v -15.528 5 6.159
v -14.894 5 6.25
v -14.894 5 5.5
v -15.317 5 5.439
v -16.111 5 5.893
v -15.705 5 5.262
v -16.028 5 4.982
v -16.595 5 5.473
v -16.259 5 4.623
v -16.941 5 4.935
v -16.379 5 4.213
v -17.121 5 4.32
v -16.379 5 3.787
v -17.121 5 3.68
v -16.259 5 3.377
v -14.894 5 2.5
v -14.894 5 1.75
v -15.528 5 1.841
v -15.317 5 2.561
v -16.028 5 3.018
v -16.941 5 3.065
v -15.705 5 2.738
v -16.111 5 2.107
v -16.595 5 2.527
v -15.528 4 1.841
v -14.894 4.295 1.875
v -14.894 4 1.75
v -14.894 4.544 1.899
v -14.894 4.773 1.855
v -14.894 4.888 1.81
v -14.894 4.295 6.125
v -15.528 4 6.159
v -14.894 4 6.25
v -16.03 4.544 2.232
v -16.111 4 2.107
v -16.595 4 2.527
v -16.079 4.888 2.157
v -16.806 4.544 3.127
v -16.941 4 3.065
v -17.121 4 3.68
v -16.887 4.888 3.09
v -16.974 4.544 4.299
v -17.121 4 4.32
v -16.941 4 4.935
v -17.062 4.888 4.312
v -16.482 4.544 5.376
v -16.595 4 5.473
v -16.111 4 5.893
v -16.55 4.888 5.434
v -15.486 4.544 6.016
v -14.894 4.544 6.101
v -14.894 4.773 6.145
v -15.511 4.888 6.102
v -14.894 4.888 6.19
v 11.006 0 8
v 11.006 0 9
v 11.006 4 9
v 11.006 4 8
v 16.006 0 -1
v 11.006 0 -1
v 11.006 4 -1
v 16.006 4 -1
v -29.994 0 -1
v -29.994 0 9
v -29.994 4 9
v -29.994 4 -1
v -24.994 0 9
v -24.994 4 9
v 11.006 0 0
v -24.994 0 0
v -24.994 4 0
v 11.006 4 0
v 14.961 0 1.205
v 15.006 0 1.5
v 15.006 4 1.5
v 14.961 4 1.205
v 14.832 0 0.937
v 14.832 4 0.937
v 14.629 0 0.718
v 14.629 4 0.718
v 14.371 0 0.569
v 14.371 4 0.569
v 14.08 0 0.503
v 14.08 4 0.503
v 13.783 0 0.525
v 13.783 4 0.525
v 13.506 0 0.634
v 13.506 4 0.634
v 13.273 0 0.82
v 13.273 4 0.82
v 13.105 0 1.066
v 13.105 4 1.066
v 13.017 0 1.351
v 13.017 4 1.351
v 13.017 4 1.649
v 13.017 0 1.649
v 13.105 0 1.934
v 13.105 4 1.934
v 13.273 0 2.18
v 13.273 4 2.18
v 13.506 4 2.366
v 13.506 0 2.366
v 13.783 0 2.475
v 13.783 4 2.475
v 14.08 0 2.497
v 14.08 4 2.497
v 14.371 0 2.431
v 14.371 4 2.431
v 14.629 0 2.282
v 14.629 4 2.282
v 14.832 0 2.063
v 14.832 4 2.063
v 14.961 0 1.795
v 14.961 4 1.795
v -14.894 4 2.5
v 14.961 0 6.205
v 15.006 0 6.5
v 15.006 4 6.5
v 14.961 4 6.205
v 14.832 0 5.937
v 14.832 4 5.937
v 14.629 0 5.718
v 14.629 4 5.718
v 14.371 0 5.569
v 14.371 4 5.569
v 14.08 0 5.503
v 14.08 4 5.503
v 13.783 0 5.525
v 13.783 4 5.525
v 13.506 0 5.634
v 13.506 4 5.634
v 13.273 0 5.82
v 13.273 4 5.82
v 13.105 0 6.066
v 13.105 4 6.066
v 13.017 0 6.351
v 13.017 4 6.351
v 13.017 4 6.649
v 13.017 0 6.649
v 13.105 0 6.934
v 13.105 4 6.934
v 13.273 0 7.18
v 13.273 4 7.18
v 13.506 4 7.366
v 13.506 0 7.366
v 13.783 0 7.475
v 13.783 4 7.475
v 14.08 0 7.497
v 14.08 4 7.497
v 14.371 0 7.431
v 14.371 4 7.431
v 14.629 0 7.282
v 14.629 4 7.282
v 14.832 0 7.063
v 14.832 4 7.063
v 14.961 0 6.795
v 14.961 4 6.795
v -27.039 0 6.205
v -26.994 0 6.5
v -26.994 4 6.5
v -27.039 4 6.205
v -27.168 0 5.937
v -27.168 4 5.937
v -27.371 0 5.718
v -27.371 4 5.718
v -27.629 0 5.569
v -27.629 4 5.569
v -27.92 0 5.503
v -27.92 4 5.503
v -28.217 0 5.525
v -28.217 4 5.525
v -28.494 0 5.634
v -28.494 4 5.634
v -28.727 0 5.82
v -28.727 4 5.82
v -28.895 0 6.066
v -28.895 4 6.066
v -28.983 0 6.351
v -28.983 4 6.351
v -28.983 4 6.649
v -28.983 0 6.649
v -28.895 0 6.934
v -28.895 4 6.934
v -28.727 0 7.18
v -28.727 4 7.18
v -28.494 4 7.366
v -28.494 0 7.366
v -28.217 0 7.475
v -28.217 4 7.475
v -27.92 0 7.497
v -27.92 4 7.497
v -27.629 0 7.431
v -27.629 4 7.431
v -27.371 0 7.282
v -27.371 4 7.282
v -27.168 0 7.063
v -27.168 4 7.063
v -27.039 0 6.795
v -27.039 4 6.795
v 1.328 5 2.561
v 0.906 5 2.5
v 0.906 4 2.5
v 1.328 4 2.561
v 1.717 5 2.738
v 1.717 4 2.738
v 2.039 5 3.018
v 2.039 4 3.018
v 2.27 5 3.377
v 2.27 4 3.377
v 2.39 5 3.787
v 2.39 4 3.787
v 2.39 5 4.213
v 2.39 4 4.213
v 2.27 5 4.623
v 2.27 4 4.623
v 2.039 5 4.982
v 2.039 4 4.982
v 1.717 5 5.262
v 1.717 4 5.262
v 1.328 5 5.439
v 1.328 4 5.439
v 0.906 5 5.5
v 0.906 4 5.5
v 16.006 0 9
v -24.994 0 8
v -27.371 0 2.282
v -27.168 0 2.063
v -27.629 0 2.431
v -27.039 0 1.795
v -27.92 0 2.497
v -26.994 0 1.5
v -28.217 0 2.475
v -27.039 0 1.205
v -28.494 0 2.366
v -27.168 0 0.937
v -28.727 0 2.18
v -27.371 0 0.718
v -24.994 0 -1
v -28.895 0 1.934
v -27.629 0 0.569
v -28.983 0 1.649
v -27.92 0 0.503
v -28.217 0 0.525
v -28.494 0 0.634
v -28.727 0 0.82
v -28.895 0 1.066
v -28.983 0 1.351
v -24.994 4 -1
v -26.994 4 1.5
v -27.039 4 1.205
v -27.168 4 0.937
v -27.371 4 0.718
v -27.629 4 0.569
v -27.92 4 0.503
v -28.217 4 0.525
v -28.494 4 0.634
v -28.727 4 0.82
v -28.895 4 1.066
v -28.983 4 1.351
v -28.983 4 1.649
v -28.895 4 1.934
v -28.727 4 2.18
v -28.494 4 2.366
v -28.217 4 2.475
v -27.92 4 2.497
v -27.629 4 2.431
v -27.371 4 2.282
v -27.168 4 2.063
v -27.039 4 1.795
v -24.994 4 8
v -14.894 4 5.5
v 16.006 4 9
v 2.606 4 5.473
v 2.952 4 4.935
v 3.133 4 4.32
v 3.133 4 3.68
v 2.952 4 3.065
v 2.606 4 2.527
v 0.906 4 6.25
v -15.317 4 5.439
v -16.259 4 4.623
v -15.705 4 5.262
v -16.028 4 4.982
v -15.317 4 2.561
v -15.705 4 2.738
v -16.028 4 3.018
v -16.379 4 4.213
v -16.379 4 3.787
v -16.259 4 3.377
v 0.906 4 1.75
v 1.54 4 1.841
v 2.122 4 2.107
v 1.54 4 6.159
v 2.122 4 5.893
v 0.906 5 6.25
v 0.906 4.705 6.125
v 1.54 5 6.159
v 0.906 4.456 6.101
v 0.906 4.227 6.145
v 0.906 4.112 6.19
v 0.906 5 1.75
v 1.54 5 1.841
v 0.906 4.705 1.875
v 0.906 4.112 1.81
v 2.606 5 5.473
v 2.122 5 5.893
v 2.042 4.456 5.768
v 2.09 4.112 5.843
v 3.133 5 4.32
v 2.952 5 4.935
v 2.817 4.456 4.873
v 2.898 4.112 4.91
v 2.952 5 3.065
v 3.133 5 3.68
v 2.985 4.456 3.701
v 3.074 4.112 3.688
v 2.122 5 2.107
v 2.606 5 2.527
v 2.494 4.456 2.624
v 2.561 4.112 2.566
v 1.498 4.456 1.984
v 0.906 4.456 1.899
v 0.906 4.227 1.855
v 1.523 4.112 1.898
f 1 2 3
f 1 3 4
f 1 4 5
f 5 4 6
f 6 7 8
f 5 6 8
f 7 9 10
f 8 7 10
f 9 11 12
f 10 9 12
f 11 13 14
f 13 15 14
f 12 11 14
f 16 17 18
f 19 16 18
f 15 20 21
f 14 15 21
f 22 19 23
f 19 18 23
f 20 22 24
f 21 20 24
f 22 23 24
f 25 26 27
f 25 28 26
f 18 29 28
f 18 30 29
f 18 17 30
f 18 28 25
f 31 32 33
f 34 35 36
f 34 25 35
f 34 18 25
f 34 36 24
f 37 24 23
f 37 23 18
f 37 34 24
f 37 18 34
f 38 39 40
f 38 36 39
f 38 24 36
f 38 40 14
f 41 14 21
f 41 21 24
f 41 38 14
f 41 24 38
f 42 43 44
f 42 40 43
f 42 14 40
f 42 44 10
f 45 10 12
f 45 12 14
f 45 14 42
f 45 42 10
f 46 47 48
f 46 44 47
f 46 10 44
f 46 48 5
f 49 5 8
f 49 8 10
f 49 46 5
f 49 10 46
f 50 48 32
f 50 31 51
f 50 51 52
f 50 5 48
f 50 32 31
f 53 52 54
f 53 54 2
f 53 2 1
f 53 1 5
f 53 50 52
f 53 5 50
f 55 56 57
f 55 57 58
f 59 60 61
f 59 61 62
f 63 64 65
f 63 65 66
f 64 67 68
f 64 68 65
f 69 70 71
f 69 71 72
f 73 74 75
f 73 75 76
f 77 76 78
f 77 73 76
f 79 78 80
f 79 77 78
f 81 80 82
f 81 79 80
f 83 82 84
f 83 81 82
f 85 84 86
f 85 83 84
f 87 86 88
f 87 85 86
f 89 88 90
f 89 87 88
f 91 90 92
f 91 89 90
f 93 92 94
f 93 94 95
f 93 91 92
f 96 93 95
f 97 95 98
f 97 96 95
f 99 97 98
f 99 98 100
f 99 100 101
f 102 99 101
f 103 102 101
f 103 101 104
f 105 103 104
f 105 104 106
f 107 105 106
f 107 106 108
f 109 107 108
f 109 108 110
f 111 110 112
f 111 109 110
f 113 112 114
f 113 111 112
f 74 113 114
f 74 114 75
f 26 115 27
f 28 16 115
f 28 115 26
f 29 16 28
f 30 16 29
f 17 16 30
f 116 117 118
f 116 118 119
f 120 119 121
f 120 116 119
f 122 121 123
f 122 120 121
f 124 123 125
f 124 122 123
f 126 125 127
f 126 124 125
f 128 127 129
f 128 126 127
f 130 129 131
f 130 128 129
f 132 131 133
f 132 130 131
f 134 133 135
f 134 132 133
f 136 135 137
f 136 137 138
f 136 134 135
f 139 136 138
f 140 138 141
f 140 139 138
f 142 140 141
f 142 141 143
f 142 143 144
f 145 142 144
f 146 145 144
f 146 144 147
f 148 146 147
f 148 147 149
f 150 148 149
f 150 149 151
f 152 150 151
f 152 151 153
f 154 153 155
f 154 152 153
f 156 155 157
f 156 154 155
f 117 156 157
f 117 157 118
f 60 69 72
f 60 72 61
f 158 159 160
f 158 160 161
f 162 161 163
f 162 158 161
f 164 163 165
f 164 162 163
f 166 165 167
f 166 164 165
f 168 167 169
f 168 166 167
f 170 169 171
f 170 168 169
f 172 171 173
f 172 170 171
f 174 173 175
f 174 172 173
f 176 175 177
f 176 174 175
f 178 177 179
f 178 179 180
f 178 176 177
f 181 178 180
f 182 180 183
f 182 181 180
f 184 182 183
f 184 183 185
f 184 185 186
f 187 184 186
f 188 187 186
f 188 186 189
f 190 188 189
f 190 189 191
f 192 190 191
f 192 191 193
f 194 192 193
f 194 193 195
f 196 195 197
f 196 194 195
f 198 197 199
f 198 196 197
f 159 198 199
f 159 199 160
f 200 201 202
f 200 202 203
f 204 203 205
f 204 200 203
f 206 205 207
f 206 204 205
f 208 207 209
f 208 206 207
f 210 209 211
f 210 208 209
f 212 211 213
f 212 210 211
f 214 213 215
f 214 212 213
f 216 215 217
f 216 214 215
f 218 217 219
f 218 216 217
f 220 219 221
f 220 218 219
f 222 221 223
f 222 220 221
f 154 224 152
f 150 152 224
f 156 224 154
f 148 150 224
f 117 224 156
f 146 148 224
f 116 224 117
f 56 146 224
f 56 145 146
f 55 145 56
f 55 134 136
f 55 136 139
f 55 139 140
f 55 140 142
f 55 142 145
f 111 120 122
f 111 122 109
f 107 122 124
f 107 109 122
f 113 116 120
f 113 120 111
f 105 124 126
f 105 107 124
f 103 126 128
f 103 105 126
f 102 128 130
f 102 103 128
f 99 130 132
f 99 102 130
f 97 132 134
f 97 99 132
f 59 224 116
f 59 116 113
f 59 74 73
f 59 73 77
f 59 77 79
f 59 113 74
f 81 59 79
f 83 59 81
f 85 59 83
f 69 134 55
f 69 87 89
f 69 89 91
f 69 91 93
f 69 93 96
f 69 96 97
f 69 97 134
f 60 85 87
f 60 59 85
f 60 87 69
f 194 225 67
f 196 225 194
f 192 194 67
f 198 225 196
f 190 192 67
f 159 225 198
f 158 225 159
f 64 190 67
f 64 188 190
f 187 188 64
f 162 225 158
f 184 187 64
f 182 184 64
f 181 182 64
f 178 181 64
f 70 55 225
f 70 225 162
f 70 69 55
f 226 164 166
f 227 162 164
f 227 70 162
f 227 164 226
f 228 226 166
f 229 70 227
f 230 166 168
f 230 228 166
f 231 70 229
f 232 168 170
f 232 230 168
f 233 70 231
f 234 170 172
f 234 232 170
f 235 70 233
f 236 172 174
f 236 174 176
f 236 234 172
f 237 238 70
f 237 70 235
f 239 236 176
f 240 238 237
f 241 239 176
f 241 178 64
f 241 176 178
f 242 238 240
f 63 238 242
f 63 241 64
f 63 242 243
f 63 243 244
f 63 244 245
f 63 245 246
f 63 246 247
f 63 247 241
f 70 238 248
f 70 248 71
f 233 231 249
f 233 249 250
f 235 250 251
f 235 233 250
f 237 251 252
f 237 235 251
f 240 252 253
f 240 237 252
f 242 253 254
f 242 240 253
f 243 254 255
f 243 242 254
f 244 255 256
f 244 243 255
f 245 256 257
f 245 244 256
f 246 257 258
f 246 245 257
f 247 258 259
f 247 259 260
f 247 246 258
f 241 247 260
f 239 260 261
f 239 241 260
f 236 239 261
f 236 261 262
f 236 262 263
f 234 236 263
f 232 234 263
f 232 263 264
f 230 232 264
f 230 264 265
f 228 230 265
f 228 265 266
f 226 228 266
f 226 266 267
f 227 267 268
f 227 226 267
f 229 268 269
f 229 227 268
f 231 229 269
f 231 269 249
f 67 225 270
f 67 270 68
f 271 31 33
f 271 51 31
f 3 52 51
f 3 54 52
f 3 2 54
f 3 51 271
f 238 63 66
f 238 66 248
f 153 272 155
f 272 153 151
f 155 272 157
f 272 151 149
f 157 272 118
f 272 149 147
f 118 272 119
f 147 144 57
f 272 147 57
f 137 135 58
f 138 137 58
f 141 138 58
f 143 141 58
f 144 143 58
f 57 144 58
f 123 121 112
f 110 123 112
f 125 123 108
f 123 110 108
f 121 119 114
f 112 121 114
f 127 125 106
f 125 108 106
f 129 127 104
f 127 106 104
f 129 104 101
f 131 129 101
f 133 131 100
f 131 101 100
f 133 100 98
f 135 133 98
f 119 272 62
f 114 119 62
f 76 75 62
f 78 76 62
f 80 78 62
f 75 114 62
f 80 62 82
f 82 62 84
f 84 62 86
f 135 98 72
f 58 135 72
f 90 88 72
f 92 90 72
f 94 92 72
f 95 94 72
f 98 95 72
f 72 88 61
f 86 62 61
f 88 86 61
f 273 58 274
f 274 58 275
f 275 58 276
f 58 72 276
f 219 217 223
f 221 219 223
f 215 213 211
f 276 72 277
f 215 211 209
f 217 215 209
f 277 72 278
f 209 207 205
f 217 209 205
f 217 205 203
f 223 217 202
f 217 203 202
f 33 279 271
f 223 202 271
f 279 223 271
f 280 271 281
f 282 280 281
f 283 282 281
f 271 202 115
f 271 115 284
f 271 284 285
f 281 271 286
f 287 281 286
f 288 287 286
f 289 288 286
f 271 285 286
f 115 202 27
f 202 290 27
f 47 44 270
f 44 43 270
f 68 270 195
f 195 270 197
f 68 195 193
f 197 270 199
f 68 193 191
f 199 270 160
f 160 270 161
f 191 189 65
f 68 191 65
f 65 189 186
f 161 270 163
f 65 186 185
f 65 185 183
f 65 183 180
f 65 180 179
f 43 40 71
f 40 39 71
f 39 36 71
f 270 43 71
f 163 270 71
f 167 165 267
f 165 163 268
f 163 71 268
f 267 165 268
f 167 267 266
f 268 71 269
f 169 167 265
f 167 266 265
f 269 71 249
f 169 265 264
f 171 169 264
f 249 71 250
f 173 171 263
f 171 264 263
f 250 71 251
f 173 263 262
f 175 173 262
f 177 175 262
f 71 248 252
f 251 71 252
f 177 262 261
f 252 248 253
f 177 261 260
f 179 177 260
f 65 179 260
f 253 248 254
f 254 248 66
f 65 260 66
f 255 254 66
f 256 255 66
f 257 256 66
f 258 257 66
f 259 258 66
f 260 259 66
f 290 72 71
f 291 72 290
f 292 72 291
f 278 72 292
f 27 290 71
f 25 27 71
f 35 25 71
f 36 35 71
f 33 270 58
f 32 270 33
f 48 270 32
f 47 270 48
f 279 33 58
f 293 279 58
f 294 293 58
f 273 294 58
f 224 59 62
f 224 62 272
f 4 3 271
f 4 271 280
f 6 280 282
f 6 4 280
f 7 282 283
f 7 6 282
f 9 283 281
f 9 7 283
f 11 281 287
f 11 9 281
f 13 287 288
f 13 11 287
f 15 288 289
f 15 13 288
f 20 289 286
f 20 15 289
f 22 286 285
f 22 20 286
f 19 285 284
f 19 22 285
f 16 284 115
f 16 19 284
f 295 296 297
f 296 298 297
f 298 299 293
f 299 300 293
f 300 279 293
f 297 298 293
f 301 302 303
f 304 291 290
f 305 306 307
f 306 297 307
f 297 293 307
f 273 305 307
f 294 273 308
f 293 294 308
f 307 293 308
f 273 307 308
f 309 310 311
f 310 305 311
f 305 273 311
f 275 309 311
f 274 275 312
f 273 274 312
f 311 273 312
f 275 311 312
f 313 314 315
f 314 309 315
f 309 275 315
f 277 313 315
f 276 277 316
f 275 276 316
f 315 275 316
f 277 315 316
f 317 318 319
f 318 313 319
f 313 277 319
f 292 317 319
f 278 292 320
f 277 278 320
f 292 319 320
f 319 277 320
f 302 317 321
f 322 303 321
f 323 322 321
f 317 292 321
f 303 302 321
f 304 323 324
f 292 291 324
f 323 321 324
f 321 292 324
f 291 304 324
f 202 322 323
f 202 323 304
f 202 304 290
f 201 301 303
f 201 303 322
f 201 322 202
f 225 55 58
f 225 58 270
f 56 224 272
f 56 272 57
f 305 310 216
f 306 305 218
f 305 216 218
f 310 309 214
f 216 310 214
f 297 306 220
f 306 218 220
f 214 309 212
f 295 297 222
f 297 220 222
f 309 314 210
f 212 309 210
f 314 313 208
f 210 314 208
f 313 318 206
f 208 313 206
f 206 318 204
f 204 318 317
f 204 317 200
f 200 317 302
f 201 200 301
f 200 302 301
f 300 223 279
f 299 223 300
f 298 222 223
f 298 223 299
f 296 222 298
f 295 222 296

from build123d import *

# Parameters (mm, degrees)
SKETCH_1_R          = 1
EXTRUDE_2_DEPTH     = 4
EXTRUDE_3_DEPTH     = 1
CUT_EXTRUDE_2_DEPTH = 1


with BuildPart() as part:
    # 草图1 → 凸台-拉伸2 (new body)
    with BuildSketch(Plane(origin=(0, 0, 0), x_dir=(1, 0, 0), z_dir=(0, 1, 0))):
        Polygon((-24.994291736, 0), (11.005708264, 0), (11.005708264, 1), (16.005708264, 1), (16.005708264, -9), (11.005708264, -9), (11.005708264, -8), (-24.994291736, -8), (-24.994291736, -9), (-29.994291736, -9), (-29.994291736, 1), (-24.994291736, 1), align=None)
        with Locations((-27.994291736, -6.5)):
            Circle(SKETCH_1_R, mode=Mode.SUBTRACT)
        with Locations((-27.994291736, -1.5)):
            Circle(SKETCH_1_R, mode=Mode.SUBTRACT)
        with Locations((14.005708264, -1.5)):
            Circle(SKETCH_1_R, mode=Mode.SUBTRACT)
        with Locations((14.005708264, -6.5)):
            Circle(SKETCH_1_R, mode=Mode.SUBTRACT)
    extrude(amount=EXTRUDE_2_DEPTH)

    # 草图2 → 凸台-拉伸3 (add)
    with BuildSketch(Plane(origin=(0, 4, 0), x_dir=(1, 0, 0), z_dir=(0, 1, 0))):
        with BuildLine():
            Line((-14.894291736, -1.75), (0.905708264, -1.75))
            ThreePointArc((0.905708264, -1.75), (3.155708264, -4), (0.905708264, -6.25))
            Line((0.905708264, -6.25), (-14.894291736, -6.25))
            ThreePointArc((-14.894291736, -6.25), (-17.144291736, -4), (-14.894291736, -1.75))
        make_face()
    extrude(amount=EXTRUDE_3_DEPTH)

    # 草图3 → 切除-拉伸2 (cut)
    with BuildSketch(Plane(origin=(0, 5, 0), x_dir=(1, 0, 0), z_dir=(0, 1, 0))):
        with BuildLine():
            Line((-14.894291736, -2.5), (-14.894291736, -1.75))
            Line((-14.894291736, -1.75), (0.905708264, -1.75))
            Line((0.905708264, -1.75), (0.905708264, -2.5))
            ThreePointArc((0.905708264, -2.5), (2.405708264, -4), (0.905708264, -5.5))
            Line((0.905708264, -5.5), (0.905708264, -6.25))
            Line((0.905708264, -6.25), (-14.894291736, -6.25))
            Line((-14.894291736, -6.25), (-14.894291736, -5.5))
            ThreePointArc((-14.894291736, -5.5), (-16.394291736, -4), (-14.894291736, -2.5))
        make_face()
    extrude(amount=-CUT_EXTRUDE_2_DEPTH, mode=Mode.SUBTRACT)

    # 切除-扫描2: sweep along a path in 草图5
    with BuildLine(Plane(origin=(0, 5, 0), x_dir=(1, 0, 0), z_dir=(0, 1, 0))) as sweep_2_path:
        CenterArc((-14.894291736, -4), 2.25, 0, 360)
    # 草图4 → 切除-扫描2 (sweep, cut)
    with BuildSketch(Plane(origin=(-14.894291736, 0, 0), x_dir=(0, 0, -1), z_dir=(1, 0, 0))):
        with BuildLine():
            Line((-6.25, 5), (-6.25, 4))
            add(Edge.make_bspline(
                [(-6.25, 5), (-5.95, 4.5), (-6.25, 4)],
                knots=[0, 0, 0, 1, 1, 1], degree=2))
        make_face()
    sweep(path=sweep_2_path.line, mode=Mode.SUBTRACT)

    # 切除-扫描3: sweep along a path in 草图9
    with BuildLine(Plane(origin=(0, 5, 0), x_dir=(1, 0, 0), z_dir=(0, 1, 0))) as sweep_3_path:
        CenterArc((0.905708264, -4), 2.25, 0, 360)
    # 草图8 → 切除-扫描3 (sweep, cut)
    with BuildSketch(Plane.ZY.offset(-0.905708264)):
        with BuildLine():
            Line((6.25, 4), (6.25, 5))
            add(Edge.make_bspline(
                [(6.25, 4), (5.95, 4.5), (6.25, 5)],
                knots=[0, 0, 0, 1, 1, 1], degree=2))
        make_face()
    sweep(path=sweep_3_path.line, mode=Mode.SUBTRACT)


solid = part.part
